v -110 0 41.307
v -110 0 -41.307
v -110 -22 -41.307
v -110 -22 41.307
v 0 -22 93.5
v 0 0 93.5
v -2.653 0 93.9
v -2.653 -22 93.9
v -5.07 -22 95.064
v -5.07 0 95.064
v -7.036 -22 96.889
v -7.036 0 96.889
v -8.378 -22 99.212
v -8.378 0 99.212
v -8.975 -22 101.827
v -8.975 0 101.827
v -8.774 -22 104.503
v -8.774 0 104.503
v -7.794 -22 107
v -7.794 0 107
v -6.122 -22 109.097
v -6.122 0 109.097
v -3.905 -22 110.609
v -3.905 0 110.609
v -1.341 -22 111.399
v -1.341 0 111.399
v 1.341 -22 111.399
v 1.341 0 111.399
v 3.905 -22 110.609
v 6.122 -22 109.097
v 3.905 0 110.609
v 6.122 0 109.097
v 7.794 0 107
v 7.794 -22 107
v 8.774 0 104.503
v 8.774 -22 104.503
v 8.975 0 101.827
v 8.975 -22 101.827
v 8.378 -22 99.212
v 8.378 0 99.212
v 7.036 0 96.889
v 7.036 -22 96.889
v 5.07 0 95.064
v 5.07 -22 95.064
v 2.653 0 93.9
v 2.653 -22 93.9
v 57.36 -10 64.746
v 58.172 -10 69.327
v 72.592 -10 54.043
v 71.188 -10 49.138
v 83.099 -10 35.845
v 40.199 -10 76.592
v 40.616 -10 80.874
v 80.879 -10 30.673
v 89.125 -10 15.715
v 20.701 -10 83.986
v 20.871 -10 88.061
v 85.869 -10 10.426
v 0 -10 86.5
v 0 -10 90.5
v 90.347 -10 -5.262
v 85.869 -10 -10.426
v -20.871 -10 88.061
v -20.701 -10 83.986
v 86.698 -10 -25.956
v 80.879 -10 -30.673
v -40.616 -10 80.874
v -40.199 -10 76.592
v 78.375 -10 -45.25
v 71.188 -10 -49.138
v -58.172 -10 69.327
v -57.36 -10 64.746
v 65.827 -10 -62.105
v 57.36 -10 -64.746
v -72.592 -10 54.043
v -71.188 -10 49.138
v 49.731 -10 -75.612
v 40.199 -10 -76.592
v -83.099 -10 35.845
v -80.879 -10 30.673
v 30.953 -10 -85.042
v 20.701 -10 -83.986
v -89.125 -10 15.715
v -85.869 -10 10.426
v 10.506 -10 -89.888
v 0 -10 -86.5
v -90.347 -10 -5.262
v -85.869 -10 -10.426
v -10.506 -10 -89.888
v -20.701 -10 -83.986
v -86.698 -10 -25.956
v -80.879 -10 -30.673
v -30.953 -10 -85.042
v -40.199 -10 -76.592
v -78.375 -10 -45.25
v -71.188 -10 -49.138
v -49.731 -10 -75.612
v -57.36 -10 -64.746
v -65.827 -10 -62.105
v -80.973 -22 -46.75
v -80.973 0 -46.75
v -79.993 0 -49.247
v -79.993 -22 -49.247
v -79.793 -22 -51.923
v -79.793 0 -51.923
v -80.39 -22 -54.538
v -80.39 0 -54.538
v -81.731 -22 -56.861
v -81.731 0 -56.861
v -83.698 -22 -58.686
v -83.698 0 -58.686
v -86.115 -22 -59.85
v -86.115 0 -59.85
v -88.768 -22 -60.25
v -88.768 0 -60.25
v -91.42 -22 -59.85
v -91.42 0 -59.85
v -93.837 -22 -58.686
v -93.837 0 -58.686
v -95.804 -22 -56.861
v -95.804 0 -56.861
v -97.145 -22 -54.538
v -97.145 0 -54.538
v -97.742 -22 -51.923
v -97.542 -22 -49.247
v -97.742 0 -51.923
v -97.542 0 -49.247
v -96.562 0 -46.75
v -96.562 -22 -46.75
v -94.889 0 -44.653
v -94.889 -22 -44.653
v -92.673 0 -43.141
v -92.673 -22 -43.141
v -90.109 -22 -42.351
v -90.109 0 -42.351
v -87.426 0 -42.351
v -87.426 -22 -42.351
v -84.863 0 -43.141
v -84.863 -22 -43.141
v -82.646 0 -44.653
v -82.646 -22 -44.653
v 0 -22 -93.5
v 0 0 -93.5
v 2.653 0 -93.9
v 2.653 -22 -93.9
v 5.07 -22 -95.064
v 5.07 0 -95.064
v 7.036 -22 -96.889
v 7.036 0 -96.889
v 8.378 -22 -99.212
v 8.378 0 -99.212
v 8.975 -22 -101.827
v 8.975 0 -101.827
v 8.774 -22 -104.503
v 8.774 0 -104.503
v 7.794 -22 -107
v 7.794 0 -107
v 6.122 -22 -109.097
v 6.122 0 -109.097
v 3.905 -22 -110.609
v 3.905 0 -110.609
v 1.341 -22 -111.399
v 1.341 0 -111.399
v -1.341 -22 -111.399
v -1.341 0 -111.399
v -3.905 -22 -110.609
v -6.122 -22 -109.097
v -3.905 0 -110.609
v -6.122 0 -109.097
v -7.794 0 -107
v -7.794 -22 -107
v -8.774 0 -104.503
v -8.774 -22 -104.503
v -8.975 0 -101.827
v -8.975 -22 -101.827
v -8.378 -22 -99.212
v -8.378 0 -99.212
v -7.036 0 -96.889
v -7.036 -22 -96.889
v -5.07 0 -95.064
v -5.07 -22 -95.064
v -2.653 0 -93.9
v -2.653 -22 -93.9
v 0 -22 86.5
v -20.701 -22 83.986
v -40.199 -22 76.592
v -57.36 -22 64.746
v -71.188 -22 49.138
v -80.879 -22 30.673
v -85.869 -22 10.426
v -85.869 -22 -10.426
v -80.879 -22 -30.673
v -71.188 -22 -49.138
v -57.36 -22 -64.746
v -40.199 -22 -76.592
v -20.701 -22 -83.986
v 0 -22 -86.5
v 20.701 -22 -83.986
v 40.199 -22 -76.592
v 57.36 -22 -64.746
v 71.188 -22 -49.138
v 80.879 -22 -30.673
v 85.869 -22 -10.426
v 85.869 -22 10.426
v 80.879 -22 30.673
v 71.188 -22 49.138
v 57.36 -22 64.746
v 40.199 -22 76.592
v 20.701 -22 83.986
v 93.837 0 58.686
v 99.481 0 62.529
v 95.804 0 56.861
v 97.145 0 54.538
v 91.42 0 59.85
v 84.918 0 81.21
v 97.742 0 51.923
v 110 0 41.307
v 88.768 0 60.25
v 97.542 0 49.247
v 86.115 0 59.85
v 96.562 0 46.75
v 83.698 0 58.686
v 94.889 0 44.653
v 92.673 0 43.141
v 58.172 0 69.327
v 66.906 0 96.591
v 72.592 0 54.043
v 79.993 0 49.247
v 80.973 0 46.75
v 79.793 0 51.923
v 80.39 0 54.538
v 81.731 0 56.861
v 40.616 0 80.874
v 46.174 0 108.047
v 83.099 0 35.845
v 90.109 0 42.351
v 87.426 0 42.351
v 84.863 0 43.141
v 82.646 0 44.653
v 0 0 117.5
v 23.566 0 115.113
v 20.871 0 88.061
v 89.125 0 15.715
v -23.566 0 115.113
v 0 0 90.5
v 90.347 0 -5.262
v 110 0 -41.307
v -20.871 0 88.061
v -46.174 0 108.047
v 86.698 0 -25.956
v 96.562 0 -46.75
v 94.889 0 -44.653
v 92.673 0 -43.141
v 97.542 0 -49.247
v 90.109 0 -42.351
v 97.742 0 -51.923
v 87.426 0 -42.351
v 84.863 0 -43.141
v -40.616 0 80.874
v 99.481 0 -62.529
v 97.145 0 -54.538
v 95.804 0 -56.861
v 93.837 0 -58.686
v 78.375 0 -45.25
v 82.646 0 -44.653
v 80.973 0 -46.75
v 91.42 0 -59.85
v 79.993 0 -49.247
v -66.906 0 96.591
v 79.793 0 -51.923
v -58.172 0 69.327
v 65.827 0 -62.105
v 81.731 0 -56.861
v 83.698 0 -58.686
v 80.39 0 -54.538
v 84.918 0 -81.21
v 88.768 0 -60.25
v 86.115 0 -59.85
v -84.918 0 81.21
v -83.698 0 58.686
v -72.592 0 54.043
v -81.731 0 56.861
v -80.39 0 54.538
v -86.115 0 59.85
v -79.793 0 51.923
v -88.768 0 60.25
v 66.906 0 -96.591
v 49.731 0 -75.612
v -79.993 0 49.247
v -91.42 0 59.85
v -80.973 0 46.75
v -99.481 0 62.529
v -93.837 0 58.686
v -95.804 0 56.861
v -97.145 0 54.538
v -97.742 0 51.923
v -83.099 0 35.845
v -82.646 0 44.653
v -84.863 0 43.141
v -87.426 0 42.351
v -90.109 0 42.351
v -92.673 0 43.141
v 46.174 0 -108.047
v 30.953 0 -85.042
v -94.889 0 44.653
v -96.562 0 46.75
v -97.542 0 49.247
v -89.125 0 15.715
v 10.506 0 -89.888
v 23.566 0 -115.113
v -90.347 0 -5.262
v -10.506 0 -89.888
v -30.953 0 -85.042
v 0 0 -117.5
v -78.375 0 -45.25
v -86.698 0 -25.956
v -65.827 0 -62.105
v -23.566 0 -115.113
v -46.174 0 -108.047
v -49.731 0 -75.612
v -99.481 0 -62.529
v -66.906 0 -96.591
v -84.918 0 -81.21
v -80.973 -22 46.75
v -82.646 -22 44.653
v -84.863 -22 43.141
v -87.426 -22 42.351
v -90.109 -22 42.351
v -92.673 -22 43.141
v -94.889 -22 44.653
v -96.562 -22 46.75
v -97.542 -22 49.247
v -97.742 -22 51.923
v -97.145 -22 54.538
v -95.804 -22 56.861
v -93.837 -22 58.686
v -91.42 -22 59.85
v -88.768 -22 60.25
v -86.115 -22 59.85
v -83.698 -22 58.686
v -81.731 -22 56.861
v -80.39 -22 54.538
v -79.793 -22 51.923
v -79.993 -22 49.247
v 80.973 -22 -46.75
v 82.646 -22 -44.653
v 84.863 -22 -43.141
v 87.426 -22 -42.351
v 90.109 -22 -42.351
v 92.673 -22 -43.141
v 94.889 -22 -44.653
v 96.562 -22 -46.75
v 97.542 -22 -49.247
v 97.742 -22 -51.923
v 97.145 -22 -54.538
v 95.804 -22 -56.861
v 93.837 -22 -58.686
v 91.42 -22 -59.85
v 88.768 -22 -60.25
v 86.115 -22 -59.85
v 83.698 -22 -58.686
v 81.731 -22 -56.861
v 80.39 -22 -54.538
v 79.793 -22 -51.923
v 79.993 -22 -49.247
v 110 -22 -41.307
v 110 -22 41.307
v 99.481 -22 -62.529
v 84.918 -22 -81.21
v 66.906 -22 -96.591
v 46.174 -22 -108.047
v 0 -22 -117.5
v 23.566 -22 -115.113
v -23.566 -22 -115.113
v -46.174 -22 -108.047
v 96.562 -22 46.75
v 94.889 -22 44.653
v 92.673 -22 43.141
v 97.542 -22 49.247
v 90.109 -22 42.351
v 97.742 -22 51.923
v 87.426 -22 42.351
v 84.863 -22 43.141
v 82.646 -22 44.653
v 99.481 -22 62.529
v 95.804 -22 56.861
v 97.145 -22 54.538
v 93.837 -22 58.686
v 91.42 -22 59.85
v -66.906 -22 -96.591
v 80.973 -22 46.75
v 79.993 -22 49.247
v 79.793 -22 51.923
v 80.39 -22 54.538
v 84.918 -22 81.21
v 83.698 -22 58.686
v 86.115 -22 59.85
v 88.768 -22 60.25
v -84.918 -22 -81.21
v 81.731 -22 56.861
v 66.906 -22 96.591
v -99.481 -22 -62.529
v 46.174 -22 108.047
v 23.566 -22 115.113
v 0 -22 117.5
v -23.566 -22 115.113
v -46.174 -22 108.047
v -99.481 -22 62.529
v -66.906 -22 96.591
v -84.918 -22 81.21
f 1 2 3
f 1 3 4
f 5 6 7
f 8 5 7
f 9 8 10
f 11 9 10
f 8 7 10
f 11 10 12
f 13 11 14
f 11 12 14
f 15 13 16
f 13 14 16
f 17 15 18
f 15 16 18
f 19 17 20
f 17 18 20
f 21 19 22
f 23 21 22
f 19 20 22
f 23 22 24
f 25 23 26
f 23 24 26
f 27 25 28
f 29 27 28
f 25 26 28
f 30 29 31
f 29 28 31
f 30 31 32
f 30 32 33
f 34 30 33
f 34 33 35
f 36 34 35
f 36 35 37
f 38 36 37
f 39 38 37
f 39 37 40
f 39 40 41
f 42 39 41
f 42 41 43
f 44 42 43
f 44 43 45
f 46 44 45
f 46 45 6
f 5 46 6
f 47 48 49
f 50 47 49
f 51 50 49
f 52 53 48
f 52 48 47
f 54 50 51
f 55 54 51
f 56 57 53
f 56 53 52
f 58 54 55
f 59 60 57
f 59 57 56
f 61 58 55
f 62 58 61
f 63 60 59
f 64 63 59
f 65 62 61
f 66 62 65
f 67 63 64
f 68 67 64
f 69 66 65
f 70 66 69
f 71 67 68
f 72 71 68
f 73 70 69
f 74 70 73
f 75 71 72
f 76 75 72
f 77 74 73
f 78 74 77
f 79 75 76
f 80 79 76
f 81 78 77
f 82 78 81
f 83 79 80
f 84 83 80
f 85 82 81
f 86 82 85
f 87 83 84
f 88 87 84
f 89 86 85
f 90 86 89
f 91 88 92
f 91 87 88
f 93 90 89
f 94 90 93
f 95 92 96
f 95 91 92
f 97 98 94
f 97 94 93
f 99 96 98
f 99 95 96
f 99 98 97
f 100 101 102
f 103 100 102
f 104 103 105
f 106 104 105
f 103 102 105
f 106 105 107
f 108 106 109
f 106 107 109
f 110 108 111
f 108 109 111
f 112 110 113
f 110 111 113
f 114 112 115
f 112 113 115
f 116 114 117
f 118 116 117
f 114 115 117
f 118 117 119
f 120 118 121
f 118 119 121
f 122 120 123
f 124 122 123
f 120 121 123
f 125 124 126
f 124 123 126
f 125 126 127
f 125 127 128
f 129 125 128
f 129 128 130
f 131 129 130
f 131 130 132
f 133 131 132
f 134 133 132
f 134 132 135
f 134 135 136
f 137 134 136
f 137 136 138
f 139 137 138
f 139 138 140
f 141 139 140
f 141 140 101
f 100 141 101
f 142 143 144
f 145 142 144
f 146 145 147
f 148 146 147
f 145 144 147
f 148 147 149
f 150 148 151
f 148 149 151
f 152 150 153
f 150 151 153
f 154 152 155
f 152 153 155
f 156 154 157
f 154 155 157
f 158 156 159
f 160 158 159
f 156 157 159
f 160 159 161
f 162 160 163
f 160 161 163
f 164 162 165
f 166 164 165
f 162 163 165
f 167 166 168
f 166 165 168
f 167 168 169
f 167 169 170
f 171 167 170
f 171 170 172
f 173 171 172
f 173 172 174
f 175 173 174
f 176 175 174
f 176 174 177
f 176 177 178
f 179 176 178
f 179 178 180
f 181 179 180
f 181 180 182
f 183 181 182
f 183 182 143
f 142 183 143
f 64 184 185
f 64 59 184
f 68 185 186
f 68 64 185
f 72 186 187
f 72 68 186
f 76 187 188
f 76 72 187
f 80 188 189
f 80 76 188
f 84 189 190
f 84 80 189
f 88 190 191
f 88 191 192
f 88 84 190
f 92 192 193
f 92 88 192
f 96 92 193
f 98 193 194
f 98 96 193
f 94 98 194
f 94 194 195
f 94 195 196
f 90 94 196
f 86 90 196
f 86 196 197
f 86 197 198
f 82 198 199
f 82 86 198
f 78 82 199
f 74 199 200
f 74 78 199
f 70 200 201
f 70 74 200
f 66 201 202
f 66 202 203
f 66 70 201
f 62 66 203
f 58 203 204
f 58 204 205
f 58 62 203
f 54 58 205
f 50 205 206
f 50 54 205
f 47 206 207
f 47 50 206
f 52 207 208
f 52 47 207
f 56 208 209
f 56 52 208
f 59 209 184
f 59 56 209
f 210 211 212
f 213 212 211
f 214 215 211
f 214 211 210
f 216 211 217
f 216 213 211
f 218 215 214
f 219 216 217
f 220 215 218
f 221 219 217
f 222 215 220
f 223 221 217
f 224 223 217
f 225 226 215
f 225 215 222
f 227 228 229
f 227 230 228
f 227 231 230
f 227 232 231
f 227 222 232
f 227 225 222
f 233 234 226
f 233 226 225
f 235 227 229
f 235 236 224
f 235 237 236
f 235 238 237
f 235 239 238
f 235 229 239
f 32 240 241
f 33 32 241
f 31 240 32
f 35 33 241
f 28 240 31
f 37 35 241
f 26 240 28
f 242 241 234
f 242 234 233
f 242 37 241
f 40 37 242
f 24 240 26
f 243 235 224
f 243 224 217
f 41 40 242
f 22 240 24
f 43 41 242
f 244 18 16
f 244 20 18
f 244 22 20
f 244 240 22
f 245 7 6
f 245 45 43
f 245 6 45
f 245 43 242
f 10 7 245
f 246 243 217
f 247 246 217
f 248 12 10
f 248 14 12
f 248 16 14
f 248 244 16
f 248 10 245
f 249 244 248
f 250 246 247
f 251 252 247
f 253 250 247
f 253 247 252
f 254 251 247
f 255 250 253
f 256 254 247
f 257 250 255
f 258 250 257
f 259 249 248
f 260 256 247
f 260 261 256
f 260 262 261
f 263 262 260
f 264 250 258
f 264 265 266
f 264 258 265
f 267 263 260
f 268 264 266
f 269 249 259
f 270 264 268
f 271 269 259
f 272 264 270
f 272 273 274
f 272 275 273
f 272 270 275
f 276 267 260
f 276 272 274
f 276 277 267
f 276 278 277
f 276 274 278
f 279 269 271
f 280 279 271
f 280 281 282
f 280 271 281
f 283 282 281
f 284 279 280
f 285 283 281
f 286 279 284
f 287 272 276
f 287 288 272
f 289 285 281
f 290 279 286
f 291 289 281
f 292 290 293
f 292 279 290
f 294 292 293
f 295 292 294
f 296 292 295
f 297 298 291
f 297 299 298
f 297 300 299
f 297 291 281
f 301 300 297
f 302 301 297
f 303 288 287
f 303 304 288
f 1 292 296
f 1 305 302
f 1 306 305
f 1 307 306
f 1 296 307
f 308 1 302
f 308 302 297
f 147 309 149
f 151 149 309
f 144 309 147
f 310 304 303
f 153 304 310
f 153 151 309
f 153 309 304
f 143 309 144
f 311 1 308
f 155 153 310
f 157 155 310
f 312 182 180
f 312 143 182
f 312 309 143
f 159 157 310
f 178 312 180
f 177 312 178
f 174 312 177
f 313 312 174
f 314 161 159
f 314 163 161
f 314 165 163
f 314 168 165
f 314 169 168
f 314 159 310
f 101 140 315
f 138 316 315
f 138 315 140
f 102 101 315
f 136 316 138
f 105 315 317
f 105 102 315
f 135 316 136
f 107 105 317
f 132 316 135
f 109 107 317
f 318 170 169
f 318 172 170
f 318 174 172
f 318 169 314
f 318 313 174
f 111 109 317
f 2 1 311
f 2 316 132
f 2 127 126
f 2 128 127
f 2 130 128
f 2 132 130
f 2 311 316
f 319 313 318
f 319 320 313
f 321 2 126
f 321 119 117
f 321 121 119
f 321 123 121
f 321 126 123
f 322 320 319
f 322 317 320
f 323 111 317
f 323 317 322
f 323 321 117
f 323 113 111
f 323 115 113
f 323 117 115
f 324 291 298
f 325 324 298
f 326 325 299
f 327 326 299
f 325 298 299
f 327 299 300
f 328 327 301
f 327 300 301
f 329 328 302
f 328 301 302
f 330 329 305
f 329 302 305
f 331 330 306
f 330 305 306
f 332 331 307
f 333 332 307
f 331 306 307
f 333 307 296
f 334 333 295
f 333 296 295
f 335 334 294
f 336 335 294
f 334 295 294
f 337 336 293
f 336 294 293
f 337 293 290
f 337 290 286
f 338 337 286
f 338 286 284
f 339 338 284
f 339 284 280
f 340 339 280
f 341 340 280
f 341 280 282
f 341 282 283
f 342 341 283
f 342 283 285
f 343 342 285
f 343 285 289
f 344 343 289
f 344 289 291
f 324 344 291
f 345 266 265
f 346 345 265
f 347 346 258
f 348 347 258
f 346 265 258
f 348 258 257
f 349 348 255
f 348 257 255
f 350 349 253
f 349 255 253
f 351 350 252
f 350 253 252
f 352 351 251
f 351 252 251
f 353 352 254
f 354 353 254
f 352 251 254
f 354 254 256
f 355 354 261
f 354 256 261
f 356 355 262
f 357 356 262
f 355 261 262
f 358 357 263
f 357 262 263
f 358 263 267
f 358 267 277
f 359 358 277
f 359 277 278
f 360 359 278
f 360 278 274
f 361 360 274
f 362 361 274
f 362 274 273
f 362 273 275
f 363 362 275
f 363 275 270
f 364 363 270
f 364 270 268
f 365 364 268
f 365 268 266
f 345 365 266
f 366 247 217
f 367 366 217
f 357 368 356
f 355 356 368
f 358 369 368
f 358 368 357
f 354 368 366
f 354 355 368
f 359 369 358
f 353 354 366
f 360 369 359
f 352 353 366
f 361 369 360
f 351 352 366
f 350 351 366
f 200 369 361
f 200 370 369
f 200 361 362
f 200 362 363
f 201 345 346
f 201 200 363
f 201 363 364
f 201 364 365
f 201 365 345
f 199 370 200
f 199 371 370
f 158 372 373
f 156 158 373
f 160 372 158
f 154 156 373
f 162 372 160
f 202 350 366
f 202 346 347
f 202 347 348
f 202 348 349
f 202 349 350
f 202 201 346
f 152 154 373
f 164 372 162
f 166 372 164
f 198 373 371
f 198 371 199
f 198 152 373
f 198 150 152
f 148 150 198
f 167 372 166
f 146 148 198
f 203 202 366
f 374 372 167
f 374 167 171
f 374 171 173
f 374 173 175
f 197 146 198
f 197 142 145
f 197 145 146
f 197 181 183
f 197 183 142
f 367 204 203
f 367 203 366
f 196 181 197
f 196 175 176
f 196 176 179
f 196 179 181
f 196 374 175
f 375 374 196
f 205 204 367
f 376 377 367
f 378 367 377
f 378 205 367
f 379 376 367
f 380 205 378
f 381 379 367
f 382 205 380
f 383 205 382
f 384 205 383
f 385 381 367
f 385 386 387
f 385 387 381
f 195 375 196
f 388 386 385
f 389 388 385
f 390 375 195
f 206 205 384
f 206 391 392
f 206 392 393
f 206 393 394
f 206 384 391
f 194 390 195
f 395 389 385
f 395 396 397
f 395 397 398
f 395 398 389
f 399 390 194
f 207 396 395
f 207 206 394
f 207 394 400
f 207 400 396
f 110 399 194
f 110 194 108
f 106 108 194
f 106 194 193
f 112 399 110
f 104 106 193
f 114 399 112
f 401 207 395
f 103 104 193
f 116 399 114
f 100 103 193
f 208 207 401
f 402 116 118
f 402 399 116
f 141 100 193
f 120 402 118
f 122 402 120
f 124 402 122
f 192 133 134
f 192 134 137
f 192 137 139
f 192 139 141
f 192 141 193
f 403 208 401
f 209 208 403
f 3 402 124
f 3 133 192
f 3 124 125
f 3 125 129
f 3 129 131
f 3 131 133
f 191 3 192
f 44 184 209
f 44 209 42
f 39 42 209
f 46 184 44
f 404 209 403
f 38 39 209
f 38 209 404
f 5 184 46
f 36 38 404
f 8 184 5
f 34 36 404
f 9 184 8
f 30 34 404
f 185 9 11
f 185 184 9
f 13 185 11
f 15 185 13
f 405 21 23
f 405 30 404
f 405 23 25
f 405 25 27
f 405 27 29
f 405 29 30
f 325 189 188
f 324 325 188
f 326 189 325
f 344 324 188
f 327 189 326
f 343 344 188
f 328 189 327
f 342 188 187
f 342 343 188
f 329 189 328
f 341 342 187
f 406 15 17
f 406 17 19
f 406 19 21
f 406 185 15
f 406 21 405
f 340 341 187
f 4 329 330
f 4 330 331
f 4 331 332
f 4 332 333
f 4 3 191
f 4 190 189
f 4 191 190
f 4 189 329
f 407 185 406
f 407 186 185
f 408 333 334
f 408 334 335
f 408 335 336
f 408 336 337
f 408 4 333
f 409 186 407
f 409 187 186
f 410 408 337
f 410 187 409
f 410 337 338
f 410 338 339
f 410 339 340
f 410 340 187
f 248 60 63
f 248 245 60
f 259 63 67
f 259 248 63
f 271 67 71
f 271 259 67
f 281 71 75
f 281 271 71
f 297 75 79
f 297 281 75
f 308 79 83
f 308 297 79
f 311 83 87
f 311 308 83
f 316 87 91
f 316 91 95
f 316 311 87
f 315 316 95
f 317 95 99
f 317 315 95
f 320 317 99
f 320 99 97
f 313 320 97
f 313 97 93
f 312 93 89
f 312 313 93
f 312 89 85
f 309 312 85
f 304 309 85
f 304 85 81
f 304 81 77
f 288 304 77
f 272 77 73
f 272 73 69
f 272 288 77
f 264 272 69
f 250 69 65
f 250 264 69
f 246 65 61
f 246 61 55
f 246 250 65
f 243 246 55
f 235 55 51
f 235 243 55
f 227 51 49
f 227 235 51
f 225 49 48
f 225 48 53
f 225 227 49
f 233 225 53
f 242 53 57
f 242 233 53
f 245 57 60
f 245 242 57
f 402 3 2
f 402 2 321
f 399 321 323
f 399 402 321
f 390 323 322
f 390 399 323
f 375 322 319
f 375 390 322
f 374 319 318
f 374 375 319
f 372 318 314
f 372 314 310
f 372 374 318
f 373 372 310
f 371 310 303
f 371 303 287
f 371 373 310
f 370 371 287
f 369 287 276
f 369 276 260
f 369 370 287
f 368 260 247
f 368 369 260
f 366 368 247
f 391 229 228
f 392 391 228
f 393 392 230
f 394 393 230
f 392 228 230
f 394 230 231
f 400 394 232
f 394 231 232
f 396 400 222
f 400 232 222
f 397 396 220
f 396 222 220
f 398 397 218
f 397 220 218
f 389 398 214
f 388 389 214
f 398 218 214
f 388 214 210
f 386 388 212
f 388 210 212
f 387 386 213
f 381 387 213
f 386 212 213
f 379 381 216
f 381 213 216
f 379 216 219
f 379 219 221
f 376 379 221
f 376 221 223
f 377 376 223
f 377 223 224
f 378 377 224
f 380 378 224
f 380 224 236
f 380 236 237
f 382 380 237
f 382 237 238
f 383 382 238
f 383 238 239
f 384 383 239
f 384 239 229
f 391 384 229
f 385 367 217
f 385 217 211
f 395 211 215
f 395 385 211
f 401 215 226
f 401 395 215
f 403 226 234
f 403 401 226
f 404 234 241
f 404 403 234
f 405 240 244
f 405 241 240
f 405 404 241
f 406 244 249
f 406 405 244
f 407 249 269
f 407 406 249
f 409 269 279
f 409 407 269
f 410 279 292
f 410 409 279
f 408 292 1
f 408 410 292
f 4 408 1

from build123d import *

# Parameters (mm, degrees)
CUT_EXTRUDE_1_DEPTH      = 168.620106193
SKETCH_3_R               = 9
CUT_EXTRUDE_2_DEPTH      = 163.450761771
PATTERN_CIRCULAR_1_COUNT = 6


with BuildPart() as part:
    # Эскиз1 → Повернуть1 (revolve)
    with BuildSketch(Plane.XY, mode=Mode.PRIVATE) as revolve_1_sk:
        Polygon((-90.5, 0), (-117.5, 0), (-117.5, -22), (-86.5, -22), (-86.5, -10), (-90.5, -10), align=None)
    revolve(revolve_1_sk.sketch.rotate(Axis((0, 22.934814099, 0), (0, -1, 0)), 270), axis=Axis((0, 22.934814099, 0), (0, -1, 0)))

    # Эскиз2 → Вырез-Вытянуть1 (cut, through all)
    with BuildSketch(Plane(origin=(0, 0, 0), x_dir=(1, 0, 0), z_dir=(0, 1, 0))):
        with BuildLine():
            Line((-110, 41.306779105), (-110, -41.306779105))
            ThreePointArc((-110, -41.306779105), (-117.5, 0), (-110, 41.306779105))
        make_face()
        with BuildLine():
            Line((110, 41.306779105), (110, -41.306779105))
            ThreePointArc((110, -41.306779105), (117.5, 0), (110, 41.306779105))
        make_face()
    extrude(amount=-CUT_EXTRUDE_1_DEPTH, mode=Mode.SUBTRACT)

    # Эскиз3 → Вырез-Вытянуть2 (cut, through all)
    with BuildSketch(Plane(origin=(0, 0, 0), x_dir=(1, 0, 0), z_dir=(0, 1, 0))):
        with Locations(Location((0, 102.5, 0), (0, 0, 270))):
            Circle(SKETCH_3_R)
    cut_extrude_2 = extrude(amount=-CUT_EXTRUDE_2_DEPTH, mode=Mode.SUBTRACT)

    # Круговой массив1: Вырез-Вытянуть2 ×6 about axis
    pattern_circular_1_axis = Axis((0, 0, 0), (0, 1, 0))
    for i in range(1, PATTERN_CIRCULAR_1_COUNT):
        add(cut_extrude_2.rotate(pattern_circular_1_axis, i * 360 / PATTERN_CIRCULAR_1_COUNT), mode=Mode.SUBTRACT)


solid = part.part
